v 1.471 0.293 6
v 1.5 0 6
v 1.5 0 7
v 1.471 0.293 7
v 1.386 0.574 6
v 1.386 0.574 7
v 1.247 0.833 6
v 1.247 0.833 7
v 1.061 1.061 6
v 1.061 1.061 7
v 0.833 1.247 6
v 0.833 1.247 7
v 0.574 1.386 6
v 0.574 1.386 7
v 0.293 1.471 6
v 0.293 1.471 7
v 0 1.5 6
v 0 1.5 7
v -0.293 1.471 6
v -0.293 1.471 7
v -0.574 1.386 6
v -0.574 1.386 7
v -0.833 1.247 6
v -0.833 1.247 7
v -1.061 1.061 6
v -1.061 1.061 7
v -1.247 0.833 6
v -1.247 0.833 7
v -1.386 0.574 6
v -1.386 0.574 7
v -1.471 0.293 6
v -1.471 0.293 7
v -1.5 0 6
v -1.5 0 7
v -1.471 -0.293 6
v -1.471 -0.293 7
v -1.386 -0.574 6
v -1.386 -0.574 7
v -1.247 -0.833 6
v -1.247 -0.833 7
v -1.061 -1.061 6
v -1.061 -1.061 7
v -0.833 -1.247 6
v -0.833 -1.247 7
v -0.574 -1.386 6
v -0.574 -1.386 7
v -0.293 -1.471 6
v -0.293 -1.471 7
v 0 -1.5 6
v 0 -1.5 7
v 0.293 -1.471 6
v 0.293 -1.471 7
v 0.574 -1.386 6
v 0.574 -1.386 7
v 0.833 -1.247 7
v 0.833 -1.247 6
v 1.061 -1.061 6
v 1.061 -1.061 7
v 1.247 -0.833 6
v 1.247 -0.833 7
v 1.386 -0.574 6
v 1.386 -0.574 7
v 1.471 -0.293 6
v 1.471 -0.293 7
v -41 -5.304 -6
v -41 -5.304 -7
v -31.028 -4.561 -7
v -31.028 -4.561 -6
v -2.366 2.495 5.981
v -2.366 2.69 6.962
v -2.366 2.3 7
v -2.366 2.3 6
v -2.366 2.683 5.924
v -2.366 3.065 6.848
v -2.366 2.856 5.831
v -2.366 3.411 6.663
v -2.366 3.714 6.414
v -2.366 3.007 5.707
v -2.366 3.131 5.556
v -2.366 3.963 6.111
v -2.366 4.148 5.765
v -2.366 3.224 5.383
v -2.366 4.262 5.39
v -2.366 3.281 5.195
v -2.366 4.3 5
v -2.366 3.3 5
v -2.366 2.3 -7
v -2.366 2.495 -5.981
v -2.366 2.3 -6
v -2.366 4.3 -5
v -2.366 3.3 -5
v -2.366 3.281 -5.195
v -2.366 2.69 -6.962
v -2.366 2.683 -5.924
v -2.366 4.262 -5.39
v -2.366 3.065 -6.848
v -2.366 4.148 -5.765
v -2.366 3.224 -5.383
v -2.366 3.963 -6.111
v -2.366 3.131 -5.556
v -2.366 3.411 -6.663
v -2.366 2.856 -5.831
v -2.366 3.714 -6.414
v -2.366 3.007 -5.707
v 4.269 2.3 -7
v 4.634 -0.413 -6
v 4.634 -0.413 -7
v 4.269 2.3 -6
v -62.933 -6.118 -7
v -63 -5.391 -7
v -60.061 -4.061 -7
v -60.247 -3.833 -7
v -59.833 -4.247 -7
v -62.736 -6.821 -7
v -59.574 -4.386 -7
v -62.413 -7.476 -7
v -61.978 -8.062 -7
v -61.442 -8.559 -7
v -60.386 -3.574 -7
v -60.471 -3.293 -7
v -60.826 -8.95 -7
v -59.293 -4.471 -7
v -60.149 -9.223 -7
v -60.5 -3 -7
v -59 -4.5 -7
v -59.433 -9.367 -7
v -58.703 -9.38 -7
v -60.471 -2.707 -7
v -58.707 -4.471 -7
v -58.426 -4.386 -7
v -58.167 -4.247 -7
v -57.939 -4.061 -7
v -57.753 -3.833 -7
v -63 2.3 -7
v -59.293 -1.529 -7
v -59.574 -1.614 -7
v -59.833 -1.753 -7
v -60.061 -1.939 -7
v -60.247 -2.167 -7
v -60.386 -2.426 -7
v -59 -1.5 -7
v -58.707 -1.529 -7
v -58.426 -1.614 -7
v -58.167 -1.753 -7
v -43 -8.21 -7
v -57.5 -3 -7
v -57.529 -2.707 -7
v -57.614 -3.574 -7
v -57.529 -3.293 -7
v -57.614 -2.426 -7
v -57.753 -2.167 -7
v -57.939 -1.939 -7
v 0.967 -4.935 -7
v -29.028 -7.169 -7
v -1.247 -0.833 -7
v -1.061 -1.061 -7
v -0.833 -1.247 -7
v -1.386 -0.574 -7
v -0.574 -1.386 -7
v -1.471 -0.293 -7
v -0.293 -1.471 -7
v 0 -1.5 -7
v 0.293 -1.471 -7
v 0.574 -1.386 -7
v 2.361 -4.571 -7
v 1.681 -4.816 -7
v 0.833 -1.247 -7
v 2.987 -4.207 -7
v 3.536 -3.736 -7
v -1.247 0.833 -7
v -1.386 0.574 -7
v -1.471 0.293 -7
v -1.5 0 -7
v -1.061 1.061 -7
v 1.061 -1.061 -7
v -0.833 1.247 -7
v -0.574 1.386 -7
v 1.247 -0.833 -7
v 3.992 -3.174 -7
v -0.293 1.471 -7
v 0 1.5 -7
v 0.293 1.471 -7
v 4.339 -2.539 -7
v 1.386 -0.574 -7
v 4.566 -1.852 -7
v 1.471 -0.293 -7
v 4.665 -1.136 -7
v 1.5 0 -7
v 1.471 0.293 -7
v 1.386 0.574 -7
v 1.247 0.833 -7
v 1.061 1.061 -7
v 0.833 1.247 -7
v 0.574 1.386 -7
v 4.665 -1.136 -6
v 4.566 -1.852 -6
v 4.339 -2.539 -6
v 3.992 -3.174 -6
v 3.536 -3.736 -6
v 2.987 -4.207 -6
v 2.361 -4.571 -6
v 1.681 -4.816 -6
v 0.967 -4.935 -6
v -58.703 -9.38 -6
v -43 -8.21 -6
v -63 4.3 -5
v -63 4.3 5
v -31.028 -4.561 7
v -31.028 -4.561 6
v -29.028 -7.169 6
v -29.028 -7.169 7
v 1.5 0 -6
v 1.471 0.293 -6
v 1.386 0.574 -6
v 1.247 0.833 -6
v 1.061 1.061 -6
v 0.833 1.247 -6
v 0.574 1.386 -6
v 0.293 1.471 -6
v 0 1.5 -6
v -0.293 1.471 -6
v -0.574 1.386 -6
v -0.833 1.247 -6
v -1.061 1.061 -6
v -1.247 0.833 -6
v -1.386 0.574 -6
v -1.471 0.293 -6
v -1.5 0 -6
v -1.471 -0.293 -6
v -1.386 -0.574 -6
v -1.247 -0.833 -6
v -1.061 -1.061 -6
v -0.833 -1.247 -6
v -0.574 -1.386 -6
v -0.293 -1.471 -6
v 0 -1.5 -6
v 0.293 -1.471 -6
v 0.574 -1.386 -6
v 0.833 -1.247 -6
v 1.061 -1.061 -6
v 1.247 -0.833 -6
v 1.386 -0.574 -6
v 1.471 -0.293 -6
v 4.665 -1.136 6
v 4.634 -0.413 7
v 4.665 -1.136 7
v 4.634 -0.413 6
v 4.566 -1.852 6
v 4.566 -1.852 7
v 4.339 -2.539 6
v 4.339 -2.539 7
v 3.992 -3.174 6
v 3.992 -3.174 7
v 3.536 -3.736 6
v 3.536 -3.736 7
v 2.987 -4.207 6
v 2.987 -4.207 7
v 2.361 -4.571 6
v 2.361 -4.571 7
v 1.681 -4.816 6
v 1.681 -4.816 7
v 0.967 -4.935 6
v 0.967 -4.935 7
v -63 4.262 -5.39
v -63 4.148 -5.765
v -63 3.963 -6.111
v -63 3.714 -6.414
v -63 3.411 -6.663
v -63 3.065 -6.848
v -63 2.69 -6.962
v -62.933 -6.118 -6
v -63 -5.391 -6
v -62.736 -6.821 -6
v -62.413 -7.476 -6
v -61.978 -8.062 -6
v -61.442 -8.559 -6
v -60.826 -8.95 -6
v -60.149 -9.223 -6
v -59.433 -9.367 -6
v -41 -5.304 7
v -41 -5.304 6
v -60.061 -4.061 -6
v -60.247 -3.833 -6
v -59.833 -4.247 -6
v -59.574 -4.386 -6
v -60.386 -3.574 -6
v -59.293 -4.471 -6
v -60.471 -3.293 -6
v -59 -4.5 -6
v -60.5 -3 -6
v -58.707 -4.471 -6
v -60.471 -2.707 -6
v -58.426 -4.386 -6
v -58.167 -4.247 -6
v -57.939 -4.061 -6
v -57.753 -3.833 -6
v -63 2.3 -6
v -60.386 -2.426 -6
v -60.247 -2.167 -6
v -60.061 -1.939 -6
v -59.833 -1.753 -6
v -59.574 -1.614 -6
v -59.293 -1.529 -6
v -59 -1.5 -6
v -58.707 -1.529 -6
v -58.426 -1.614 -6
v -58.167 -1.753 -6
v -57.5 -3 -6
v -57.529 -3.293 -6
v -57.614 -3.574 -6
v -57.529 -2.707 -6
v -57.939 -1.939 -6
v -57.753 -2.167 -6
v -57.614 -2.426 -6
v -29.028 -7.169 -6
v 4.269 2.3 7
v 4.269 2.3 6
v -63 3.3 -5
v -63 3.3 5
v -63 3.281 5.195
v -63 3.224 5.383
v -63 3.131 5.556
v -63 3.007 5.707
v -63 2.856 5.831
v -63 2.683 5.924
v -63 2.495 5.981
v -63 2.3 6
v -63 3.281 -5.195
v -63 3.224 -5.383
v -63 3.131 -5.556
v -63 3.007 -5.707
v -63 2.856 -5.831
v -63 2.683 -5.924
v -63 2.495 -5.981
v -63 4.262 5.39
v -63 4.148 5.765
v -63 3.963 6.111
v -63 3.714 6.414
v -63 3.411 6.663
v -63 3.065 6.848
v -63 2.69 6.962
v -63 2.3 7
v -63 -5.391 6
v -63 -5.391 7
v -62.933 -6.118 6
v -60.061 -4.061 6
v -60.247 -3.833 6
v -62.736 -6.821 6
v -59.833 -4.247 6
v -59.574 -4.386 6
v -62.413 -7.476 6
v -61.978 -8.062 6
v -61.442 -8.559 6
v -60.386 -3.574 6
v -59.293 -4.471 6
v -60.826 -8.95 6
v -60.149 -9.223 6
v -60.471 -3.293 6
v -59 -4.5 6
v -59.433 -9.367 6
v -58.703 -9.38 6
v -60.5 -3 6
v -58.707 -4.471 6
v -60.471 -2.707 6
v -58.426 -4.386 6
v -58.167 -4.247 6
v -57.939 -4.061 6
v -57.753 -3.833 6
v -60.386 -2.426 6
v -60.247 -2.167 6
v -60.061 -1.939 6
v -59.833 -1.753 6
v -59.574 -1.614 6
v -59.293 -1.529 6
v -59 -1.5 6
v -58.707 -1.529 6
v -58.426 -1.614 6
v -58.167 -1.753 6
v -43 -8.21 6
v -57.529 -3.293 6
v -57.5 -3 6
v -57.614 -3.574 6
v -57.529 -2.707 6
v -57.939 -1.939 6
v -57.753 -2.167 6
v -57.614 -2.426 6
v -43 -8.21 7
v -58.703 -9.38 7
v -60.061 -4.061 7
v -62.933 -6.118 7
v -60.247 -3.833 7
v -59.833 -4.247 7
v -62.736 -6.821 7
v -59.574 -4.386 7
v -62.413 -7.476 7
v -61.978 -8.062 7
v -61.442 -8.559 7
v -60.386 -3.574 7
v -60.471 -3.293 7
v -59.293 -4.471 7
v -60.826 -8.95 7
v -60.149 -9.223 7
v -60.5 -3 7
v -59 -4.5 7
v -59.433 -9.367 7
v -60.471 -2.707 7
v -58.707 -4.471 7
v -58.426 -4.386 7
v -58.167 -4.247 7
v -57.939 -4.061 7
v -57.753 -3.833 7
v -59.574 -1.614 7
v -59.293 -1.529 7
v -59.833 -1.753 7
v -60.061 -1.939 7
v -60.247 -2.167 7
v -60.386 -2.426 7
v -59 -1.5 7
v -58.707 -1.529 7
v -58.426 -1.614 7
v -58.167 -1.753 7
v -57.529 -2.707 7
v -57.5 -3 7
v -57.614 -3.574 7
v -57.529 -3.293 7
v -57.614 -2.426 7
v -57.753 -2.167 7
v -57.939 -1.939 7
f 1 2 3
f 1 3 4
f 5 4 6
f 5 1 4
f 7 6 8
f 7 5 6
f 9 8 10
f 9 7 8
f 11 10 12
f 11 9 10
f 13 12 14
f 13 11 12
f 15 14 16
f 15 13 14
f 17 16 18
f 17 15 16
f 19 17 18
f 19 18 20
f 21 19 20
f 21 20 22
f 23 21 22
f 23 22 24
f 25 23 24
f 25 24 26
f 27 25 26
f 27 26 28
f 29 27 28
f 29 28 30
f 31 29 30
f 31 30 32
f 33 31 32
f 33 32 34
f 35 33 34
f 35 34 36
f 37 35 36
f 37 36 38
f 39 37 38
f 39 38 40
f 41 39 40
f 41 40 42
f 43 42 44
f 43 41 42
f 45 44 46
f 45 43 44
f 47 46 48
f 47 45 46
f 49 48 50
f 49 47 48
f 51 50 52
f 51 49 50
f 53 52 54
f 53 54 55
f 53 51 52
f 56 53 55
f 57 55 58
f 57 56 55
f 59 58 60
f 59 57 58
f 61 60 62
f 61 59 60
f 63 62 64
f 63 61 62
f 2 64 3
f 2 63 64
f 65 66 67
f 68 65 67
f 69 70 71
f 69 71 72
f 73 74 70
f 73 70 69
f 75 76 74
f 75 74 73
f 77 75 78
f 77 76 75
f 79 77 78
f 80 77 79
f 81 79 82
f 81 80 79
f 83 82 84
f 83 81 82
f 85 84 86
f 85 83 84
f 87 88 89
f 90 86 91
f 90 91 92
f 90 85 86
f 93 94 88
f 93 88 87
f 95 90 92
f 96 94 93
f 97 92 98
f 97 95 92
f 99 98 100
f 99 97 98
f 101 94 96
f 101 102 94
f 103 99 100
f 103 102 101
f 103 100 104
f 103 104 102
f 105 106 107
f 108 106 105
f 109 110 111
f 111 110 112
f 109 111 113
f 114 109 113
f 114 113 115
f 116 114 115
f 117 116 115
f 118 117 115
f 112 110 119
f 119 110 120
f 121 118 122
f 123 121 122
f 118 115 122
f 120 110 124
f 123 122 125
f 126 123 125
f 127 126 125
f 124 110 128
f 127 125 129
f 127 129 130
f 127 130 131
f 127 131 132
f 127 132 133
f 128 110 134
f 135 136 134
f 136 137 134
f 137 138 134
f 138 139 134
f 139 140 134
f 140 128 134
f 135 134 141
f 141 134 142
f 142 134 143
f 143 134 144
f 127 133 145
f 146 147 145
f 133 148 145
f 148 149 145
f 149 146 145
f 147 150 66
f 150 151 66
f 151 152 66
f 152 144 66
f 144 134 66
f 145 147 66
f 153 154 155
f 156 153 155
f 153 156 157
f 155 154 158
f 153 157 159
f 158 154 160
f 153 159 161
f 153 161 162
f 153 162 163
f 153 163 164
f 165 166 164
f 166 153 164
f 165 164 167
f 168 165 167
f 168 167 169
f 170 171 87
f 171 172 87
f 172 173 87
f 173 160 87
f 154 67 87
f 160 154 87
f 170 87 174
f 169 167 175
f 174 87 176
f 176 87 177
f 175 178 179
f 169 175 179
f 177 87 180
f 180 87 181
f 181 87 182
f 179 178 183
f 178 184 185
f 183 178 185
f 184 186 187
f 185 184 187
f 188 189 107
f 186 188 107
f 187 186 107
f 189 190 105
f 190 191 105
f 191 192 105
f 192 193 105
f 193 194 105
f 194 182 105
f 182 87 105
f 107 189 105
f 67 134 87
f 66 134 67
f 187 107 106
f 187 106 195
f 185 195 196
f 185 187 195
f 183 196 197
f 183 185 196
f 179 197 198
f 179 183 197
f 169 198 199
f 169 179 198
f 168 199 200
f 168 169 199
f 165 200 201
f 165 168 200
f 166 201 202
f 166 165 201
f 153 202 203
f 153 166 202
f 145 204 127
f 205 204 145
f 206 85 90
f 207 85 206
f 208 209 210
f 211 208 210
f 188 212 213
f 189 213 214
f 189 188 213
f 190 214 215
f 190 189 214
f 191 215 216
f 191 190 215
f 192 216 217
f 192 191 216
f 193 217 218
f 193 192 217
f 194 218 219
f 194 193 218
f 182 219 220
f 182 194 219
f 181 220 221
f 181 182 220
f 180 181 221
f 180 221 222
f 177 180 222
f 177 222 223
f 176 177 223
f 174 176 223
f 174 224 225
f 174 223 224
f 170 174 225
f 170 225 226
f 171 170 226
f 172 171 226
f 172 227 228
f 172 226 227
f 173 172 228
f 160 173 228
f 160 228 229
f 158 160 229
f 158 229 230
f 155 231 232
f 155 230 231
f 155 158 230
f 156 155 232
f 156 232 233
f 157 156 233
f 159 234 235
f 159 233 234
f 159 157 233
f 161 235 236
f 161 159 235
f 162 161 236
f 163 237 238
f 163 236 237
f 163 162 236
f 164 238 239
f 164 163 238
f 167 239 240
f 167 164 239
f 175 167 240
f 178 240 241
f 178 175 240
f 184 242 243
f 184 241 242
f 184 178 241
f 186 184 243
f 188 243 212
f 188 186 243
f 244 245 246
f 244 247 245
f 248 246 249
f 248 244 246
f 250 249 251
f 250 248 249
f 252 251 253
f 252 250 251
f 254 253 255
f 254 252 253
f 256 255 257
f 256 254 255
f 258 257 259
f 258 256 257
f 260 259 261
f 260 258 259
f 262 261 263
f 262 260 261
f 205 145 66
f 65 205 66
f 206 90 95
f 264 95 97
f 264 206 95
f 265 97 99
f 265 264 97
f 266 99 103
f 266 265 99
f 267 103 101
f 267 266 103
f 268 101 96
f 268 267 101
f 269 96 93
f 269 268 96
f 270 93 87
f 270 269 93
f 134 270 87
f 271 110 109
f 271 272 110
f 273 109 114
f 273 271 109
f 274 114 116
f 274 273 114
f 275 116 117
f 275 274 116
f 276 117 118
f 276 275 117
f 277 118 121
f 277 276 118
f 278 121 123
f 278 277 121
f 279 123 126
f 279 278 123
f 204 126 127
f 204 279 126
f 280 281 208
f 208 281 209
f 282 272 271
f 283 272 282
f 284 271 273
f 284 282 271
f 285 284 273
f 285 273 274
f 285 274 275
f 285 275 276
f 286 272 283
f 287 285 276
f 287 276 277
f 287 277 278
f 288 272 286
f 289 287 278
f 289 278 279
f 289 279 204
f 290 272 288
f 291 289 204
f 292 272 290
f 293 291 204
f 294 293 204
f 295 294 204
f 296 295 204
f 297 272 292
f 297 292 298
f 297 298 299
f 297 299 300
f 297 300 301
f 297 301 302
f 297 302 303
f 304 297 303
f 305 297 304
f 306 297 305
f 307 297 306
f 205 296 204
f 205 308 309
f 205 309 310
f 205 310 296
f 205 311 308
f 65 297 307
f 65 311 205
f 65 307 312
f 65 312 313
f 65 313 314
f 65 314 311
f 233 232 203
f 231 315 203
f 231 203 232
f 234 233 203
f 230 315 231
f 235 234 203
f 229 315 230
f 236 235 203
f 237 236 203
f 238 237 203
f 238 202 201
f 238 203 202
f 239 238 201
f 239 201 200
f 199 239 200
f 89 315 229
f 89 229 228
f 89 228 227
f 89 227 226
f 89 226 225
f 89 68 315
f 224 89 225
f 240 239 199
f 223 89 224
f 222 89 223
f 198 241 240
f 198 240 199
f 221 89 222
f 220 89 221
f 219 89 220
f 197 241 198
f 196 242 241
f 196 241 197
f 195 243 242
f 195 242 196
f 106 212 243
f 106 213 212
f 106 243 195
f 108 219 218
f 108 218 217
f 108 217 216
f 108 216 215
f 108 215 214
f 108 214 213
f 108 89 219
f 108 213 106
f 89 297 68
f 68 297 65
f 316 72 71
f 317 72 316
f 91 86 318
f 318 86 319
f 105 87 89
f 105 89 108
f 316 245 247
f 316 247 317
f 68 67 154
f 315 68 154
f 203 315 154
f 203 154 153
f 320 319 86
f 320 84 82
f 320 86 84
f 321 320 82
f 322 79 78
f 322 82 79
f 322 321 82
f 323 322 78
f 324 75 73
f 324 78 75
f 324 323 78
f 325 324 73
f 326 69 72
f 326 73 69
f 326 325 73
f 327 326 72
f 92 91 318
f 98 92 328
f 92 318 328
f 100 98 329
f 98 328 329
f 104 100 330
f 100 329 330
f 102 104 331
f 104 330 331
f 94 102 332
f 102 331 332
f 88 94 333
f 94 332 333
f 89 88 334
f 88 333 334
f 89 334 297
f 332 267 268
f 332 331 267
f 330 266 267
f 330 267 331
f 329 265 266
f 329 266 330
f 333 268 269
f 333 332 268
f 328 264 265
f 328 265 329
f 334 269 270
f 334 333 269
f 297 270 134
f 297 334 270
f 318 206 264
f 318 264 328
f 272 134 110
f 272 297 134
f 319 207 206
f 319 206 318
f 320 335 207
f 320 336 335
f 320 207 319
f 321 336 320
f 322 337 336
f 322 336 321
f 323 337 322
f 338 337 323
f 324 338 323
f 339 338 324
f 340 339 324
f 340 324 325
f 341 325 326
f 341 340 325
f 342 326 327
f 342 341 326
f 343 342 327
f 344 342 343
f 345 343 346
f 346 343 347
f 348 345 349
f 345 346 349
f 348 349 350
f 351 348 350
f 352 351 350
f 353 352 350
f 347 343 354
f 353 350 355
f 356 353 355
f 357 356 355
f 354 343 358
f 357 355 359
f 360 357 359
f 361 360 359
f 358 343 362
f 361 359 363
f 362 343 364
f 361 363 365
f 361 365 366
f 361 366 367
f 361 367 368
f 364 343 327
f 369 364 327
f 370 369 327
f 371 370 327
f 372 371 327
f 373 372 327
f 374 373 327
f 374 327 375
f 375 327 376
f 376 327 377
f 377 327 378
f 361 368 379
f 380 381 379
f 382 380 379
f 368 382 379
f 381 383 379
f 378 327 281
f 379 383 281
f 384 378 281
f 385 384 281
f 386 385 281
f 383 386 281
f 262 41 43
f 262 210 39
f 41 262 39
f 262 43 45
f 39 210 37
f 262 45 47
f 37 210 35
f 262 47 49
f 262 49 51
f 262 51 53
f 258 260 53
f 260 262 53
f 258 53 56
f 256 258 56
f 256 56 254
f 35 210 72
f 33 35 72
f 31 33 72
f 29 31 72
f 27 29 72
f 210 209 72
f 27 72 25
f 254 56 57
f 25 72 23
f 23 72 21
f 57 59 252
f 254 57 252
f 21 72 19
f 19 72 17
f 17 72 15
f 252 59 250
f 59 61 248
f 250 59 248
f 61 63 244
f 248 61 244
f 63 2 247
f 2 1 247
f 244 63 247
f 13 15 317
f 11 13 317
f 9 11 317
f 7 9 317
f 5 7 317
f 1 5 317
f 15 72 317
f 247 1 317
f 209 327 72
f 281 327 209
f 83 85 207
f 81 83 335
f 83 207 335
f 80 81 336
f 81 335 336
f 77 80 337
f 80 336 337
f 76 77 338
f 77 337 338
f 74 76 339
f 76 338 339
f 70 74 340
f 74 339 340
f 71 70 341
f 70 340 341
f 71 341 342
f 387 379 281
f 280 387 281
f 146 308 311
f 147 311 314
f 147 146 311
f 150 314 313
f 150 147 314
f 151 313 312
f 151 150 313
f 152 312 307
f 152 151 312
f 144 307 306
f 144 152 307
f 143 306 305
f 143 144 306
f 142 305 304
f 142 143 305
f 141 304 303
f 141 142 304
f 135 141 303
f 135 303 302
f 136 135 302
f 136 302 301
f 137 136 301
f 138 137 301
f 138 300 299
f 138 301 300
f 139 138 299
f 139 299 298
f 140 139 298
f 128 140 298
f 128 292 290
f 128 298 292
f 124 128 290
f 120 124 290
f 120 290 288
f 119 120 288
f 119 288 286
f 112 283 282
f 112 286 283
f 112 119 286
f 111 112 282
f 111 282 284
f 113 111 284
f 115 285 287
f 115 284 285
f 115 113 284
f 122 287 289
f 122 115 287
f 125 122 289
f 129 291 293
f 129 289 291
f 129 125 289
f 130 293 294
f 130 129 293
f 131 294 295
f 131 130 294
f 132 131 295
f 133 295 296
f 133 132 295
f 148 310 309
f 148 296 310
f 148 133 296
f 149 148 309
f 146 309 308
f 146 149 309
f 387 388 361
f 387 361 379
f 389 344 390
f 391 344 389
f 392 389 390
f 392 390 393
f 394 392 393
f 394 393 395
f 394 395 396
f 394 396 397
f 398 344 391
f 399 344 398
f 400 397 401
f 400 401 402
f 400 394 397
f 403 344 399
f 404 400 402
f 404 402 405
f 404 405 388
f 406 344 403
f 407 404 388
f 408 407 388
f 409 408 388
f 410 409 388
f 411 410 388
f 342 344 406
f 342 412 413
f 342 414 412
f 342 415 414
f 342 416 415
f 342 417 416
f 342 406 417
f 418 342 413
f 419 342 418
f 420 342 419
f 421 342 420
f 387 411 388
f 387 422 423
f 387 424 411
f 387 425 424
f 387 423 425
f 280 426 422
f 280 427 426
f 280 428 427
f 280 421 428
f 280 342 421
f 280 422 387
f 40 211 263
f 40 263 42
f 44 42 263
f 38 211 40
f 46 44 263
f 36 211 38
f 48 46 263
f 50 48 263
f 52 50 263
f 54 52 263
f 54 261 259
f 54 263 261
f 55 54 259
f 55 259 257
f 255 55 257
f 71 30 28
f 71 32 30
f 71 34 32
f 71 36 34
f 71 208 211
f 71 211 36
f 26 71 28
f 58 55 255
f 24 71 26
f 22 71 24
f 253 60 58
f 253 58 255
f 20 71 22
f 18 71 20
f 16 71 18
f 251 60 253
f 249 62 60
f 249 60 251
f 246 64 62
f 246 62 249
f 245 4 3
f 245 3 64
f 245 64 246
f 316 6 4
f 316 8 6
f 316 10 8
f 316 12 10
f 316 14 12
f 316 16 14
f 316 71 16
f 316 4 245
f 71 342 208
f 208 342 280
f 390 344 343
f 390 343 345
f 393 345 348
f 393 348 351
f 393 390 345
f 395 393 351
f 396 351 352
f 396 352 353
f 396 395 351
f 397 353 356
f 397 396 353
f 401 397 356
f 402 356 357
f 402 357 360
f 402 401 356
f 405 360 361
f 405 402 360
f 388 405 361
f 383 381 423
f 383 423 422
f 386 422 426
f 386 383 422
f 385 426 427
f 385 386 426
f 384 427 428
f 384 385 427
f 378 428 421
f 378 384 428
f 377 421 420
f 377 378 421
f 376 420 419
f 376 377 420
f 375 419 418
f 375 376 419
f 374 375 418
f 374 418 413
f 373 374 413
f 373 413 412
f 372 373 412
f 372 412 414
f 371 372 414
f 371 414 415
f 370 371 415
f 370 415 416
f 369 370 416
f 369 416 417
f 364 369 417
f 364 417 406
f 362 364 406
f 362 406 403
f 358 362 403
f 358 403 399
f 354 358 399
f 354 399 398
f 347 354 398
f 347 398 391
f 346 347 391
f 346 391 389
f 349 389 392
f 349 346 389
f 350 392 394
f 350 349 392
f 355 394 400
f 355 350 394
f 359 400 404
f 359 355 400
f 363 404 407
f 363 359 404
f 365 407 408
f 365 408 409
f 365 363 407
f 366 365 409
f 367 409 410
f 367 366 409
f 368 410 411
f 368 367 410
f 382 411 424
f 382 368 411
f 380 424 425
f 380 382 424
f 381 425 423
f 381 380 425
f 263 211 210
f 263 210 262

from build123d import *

# Parameters (mm, degrees)
SKETCH1_R               = 1.5
BOSS_EXTRUDE1_DEPTH     = 7
FILLET1_R               = 2
FILLET2_R               = 4
SHELL1_T                = -1
CUT_EXTRUDE1_DEPTH      = 65.079559318
CUT_EXTRUDE1_DEPTH_BACK = 65.079559318
SKETCH3_W               = 7
SKETCH3_H               = 14
CUT_EXTRUDE2_DEPTH      = 2


with BuildPart() as part:
    # Sketch1 → Boss-Extrude1 (new, symmetric)
    with BuildSketch(Plane.XY):
        Polygon((4, 4.3), (-63, 4.3), (-63, -9.7), (5.2, -4.619641248), align=None)
        Circle(SKETCH1_R, mode=Mode.SUBTRACT)
        with Locations((-59, -3)):
            Circle(SKETCH1_R, mode=Mode.SUBTRACT)
    extrude(amount=BOSS_EXTRUDE1_DEPTH, both=True)

    # Fillet1
    fillet1_edges = [part.edges().sort_by_distance(p)[0] for p in [
        (-29.5, 4.3, 7),
        (-29.5, 4.3, -7),
    ]]
    fillet(fillet1_edges, radius=FILLET1_R)

    # Fillet2
    fillet2_edges = [part.edges().sort_by_distance(p)[0] for p in [
        (-63, -9.7, 0),
        (5.2, -4.619641248, 0),
    ]]
    fillet(fillet2_edges, radius=FILLET2_R)

    # Shell1
    shell1_openings = [part.faces().sort_by_distance(p)[0] for p in [
        (-60.5, -3, 0),
        (-1.5, 0, 0),
        (-61.721343434, -8.3225509, 0),
        (3.776615154, -3.465411477, 0),
        (-63, -0.601849653, 0),
        (4.323873752, 1.892635268, 0),
        (-28.867987445, -7.157435943, 0),
    ]]
    offset(amount=SHELL1_T, openings=shell1_openings, kind=Kind.INTERSECTION)

    # Sketch2 → Cut-Extrude1 (cut, two sides: drawn at the far end of the back side and taken through both)
    with BuildSketch(Plane.XY.offset(-CUT_EXTRUDE1_DEPTH_BACK)):
        Polygon((-43, -8.210158724), (-41, -5.303555184), (-31.027630399, -4.560692791), (-29.027630399, -7.169328076), align=None)
    extrude(amount=CUT_EXTRUDE1_DEPTH + CUT_EXTRUDE1_DEPTH_BACK, mode=Mode.SUBTRACT)

    # Sketch3 → Cut-Extrude2 (cut)
    with BuildSketch(Plane(origin=(0, 4.3, 0), x_dir=(1, 0, 0), z_dir=(0, 1, 0))):
        with Locations((1.134020196, 0)):
            Rectangle(SKETCH3_W, SKETCH3_H)
    extrude(amount=-CUT_EXTRUDE2_DEPTH, mode=Mode.SUBTRACT)


solid = part.part
